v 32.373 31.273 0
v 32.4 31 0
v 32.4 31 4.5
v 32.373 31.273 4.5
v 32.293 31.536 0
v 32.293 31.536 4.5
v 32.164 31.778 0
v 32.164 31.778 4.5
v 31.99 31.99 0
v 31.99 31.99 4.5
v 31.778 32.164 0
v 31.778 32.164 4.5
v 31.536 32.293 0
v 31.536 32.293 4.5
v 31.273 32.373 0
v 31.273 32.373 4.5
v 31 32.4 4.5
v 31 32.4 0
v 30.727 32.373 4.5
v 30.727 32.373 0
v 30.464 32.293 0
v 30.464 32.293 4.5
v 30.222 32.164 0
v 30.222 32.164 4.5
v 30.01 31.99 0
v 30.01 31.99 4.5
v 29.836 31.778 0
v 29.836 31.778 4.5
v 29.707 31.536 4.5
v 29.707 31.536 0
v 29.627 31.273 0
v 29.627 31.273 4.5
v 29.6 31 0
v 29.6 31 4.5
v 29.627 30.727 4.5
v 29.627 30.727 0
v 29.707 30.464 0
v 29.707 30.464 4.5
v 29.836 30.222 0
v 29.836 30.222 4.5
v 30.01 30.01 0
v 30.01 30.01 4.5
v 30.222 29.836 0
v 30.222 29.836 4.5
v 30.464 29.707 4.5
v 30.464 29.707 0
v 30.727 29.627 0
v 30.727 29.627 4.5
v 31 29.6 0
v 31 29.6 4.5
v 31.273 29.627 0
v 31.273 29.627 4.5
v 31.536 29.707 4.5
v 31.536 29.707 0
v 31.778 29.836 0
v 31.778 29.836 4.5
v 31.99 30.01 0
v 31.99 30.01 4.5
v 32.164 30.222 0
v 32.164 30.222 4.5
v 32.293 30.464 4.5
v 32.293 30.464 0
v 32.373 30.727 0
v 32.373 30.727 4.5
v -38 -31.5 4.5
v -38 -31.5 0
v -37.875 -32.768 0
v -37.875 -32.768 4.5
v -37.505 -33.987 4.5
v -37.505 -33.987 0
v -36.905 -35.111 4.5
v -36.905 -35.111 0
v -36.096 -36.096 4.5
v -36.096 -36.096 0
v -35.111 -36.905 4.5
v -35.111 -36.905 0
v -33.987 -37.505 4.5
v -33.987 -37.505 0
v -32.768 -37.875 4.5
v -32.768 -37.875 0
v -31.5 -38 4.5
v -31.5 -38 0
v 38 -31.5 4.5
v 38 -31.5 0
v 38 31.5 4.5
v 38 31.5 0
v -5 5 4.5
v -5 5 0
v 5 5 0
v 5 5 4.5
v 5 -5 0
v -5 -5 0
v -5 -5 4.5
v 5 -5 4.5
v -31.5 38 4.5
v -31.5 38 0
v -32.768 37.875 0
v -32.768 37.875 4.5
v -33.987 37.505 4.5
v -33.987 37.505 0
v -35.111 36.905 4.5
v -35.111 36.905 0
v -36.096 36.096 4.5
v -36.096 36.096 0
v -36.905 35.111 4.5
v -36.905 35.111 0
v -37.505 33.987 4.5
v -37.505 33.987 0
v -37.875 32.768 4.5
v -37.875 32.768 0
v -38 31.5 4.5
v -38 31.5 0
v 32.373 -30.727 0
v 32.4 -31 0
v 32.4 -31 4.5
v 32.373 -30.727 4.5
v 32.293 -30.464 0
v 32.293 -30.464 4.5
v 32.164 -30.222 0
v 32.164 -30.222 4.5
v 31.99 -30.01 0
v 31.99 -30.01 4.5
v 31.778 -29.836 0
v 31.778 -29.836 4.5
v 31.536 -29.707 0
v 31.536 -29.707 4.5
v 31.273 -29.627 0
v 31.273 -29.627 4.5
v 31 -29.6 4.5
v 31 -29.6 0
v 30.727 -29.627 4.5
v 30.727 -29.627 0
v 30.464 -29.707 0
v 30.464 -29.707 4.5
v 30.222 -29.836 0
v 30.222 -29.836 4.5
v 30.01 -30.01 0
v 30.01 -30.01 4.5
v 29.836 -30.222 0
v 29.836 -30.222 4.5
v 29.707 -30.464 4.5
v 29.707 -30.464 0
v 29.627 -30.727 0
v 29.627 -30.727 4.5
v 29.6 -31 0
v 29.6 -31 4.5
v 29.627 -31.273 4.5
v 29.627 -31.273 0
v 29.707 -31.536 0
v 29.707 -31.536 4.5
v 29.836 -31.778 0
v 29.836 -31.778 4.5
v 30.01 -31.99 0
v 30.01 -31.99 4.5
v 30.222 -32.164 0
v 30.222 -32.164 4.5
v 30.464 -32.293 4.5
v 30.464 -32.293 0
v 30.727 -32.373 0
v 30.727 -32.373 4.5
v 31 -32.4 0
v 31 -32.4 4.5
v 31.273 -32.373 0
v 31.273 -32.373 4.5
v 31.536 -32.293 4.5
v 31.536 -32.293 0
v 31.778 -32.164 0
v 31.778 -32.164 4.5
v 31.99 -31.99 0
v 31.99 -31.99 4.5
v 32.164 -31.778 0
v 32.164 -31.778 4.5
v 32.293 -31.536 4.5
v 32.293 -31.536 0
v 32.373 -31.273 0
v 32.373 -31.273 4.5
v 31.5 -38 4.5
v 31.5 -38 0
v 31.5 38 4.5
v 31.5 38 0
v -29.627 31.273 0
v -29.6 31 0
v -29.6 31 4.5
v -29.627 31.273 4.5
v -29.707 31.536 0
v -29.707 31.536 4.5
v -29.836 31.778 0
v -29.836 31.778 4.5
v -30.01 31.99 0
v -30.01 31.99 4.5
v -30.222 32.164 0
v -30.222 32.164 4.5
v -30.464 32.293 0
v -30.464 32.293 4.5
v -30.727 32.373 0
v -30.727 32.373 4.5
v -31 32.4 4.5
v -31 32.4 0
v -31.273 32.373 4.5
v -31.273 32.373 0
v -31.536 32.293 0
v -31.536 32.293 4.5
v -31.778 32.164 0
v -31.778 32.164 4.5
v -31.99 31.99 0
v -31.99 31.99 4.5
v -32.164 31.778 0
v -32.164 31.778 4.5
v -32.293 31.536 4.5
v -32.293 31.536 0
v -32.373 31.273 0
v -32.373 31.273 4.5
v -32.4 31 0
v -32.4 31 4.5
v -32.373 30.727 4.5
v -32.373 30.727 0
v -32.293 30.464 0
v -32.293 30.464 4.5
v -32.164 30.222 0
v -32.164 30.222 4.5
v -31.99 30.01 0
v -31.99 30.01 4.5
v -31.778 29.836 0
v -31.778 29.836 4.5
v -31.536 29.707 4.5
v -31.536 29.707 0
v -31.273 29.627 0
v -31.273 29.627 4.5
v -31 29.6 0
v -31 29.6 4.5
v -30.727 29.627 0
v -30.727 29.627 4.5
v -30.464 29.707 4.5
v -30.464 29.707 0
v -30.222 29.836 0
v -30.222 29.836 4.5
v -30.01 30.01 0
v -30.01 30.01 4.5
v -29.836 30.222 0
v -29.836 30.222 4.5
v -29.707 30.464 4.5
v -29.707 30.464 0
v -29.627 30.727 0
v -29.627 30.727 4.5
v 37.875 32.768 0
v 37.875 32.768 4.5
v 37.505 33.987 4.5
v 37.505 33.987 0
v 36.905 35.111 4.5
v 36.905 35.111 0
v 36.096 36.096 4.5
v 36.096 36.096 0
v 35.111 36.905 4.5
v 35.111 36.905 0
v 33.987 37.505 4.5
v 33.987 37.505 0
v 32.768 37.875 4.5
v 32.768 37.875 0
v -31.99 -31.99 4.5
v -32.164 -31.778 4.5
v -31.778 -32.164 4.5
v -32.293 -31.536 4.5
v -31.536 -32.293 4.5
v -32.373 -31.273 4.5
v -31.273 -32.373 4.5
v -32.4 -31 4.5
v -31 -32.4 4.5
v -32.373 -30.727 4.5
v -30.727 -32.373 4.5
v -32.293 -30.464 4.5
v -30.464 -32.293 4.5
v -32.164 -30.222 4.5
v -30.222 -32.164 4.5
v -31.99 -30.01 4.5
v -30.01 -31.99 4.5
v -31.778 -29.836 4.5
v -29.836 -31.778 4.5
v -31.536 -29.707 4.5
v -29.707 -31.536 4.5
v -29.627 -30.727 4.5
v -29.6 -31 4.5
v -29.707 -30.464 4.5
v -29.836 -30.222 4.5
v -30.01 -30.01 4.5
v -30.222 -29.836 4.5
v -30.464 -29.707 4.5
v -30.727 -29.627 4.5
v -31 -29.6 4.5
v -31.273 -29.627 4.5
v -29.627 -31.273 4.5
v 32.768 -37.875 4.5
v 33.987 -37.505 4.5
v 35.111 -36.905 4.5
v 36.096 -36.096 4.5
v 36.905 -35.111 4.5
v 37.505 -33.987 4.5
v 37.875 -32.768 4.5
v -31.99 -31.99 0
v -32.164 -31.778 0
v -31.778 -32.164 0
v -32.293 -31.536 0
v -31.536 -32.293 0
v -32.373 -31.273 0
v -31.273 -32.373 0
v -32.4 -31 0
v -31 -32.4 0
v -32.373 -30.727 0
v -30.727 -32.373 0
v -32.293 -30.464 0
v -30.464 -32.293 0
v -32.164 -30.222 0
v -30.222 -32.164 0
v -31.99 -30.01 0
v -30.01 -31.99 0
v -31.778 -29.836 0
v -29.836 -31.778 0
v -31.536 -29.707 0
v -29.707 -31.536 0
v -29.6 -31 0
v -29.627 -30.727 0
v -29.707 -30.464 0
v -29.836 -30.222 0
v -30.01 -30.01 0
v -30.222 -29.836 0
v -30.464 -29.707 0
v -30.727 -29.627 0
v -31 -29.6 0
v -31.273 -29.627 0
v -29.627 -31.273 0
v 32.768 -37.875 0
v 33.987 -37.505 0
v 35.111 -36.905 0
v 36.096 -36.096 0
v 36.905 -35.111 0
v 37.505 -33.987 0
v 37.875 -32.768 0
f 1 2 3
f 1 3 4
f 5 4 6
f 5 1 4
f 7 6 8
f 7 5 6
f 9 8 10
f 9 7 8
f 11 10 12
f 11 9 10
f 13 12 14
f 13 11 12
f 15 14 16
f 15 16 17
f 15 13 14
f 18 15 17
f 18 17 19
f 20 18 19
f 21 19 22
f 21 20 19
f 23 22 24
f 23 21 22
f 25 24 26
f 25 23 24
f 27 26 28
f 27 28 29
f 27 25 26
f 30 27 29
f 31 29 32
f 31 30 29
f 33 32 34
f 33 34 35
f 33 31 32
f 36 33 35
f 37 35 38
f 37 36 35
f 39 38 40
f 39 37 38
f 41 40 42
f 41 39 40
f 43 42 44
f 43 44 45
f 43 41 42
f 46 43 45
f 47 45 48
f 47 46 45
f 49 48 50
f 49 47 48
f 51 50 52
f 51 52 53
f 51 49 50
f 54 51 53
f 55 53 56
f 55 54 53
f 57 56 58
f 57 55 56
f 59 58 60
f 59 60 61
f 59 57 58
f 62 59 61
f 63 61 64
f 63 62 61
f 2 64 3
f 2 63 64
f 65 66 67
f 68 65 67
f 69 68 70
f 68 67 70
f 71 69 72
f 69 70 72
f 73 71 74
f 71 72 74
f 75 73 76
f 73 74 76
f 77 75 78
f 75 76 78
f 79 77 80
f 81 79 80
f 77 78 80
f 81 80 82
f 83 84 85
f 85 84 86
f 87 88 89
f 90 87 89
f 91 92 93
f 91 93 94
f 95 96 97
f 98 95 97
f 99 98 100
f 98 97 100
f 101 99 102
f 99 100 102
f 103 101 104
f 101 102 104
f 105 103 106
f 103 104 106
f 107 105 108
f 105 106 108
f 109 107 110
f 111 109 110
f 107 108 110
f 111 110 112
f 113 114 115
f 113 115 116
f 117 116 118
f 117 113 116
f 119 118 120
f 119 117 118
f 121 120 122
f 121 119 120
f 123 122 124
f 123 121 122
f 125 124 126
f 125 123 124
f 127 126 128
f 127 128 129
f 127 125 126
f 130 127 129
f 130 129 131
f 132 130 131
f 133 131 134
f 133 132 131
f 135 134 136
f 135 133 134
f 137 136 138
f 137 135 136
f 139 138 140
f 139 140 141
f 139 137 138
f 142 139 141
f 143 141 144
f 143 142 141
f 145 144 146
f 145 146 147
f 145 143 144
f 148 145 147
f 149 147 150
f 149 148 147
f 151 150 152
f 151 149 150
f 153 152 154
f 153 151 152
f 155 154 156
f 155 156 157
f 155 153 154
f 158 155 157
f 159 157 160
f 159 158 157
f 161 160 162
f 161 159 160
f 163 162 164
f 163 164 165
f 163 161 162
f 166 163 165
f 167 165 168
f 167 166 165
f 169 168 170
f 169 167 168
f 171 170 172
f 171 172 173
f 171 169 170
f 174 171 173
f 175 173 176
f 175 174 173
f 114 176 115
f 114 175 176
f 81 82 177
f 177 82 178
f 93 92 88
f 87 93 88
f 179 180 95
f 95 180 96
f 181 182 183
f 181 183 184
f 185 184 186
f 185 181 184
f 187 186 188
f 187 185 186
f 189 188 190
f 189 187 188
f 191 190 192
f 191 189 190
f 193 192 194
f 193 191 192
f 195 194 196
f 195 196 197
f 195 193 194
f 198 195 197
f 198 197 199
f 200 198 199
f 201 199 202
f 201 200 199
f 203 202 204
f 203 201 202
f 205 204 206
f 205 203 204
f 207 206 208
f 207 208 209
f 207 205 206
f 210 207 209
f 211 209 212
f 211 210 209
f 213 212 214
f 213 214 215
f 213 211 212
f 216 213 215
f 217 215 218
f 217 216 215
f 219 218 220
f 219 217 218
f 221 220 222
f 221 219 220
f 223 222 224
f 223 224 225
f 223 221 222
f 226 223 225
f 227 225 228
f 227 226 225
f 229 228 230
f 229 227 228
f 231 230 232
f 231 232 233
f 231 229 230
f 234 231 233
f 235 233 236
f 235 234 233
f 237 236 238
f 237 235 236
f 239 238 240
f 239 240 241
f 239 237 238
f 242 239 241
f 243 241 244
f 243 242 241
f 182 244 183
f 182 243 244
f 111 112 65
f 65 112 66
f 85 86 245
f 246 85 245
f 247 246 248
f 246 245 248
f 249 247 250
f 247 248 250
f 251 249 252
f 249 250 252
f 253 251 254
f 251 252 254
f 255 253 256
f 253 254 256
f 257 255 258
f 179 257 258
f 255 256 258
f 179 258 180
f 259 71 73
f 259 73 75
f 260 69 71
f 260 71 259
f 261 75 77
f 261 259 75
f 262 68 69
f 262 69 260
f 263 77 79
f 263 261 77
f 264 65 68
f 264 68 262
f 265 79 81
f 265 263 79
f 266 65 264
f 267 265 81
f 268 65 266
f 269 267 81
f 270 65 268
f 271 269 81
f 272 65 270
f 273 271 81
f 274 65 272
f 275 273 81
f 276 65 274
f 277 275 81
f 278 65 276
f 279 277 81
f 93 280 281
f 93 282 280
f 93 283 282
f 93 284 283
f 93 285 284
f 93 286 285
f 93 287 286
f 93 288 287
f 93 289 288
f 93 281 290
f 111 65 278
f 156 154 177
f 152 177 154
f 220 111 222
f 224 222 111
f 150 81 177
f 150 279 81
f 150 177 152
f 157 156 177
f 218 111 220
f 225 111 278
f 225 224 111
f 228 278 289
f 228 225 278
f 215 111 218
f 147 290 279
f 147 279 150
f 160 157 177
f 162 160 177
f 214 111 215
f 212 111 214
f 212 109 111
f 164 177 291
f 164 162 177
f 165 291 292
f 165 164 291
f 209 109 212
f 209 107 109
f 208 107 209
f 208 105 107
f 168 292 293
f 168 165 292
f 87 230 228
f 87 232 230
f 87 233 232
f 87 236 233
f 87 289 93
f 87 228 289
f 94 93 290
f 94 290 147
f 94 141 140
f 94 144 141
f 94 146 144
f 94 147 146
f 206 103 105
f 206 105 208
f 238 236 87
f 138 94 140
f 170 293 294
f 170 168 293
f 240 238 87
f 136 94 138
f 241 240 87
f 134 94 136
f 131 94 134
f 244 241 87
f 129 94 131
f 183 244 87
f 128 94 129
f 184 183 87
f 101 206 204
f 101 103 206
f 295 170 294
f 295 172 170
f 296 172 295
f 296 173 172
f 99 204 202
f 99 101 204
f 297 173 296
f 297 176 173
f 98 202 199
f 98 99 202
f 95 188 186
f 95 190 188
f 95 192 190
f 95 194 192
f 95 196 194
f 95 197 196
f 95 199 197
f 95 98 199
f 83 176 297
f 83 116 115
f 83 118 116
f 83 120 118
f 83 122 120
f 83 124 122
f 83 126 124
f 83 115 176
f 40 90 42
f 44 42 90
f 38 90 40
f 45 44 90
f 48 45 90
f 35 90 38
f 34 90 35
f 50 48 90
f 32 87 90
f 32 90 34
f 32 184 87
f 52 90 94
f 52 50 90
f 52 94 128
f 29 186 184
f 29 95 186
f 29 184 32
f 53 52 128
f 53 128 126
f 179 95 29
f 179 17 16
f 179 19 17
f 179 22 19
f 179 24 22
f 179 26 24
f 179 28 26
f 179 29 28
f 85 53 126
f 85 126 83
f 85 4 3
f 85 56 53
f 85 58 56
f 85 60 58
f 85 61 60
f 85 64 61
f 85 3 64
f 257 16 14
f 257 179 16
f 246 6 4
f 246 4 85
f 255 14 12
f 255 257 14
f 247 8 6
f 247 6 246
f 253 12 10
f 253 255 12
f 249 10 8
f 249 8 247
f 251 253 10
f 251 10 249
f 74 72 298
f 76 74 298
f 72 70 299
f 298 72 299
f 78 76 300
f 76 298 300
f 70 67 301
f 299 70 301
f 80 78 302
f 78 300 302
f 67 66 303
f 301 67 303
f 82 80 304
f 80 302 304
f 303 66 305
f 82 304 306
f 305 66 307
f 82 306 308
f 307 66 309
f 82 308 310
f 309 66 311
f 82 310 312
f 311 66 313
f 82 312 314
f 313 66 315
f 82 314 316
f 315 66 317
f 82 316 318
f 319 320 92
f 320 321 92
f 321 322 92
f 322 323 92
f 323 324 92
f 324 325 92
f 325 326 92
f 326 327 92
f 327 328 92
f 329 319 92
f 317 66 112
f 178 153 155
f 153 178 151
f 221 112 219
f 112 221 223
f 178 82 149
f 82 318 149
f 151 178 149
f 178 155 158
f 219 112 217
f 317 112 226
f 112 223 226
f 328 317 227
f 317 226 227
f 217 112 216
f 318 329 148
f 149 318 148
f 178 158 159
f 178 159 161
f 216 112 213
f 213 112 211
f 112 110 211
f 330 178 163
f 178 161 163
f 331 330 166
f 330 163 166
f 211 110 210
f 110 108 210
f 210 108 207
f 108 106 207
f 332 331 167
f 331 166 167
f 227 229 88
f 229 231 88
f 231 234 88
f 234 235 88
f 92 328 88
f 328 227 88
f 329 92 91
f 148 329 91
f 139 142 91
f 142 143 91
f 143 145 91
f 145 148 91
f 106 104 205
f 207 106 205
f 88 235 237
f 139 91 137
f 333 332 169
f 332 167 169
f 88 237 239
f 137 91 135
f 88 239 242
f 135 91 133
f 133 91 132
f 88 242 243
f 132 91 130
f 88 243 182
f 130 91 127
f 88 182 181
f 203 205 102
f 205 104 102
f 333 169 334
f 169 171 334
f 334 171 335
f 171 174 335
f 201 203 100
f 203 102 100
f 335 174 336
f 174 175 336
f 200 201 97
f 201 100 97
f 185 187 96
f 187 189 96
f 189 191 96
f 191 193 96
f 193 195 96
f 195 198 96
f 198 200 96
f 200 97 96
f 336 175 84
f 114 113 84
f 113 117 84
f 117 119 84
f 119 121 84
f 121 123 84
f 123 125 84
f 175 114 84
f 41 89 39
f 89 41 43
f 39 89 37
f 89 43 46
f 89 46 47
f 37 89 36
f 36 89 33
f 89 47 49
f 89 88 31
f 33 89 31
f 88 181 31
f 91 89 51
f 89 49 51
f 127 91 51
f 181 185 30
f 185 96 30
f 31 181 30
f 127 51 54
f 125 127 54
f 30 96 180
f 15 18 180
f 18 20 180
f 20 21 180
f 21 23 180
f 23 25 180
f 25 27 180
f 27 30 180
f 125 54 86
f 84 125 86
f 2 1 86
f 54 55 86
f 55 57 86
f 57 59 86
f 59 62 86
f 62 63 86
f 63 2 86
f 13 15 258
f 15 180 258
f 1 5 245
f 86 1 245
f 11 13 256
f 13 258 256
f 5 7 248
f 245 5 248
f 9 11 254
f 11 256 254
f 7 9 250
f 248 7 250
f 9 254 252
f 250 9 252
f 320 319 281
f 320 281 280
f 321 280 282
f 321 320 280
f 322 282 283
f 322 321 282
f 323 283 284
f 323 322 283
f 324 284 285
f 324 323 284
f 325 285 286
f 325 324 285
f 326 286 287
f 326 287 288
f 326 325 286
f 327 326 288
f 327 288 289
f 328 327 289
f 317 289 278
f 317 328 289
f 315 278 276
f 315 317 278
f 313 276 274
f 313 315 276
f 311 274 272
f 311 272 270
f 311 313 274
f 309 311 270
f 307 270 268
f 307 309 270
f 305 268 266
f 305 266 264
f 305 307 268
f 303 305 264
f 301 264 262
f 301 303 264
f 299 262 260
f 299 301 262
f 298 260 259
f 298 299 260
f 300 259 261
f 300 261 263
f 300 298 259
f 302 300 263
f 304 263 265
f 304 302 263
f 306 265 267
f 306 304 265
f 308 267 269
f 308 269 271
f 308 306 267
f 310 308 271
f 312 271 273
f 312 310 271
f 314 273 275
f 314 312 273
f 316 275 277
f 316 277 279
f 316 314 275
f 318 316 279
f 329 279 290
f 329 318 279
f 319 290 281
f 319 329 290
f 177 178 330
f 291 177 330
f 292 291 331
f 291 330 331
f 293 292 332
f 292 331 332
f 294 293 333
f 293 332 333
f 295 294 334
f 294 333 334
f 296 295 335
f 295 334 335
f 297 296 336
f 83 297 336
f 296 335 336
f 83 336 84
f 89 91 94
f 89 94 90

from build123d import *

# Parameters (mm, degrees)
F0_R     = 1.4
F0_W     = 10
F0_H     = 10
F1_DEPTH = 4.5


with BuildPart() as f1:
    # F0 (on Top) → F1 (new body)
    with BuildSketch(Plane.XY):
        with BuildLine():
            Line((-31.5, -38), (31.5, -38))
            ThreePointArc((31.5, -38), (36.096194, -36.096194), (38, -31.5))
            Line((38, -31.5), (38, 31.5))
            ThreePointArc((38, 31.5), (36.096194, 36.096194), (31.5, 38))
            Line((31.5, 38), (-31.5, 38))
            ThreePointArc((-31.5, 38), (-36.096194, 36.096194), (-38, 31.5))
            Line((-38, 31.5), (-38, -31.5))
            ThreePointArc((-38, -31.5), (-36.096194, -36.096194), (-31.5, -38))
        make_face()
        with Locations((-31, -31)):
            Circle(F0_R, mode=Mode.SUBTRACT)
        with Locations((31, -31)):
            Circle(F0_R, mode=Mode.SUBTRACT)
        with Locations((-31, 31)):
            Circle(F0_R, mode=Mode.SUBTRACT)
        Rectangle(F0_W, F0_H, mode=Mode.SUBTRACT)
        with Locations((31, 31)):
            Circle(F0_R, mode=Mode.SUBTRACT)
    extrude(amount=F1_DEPTH)


solid = f1.part
